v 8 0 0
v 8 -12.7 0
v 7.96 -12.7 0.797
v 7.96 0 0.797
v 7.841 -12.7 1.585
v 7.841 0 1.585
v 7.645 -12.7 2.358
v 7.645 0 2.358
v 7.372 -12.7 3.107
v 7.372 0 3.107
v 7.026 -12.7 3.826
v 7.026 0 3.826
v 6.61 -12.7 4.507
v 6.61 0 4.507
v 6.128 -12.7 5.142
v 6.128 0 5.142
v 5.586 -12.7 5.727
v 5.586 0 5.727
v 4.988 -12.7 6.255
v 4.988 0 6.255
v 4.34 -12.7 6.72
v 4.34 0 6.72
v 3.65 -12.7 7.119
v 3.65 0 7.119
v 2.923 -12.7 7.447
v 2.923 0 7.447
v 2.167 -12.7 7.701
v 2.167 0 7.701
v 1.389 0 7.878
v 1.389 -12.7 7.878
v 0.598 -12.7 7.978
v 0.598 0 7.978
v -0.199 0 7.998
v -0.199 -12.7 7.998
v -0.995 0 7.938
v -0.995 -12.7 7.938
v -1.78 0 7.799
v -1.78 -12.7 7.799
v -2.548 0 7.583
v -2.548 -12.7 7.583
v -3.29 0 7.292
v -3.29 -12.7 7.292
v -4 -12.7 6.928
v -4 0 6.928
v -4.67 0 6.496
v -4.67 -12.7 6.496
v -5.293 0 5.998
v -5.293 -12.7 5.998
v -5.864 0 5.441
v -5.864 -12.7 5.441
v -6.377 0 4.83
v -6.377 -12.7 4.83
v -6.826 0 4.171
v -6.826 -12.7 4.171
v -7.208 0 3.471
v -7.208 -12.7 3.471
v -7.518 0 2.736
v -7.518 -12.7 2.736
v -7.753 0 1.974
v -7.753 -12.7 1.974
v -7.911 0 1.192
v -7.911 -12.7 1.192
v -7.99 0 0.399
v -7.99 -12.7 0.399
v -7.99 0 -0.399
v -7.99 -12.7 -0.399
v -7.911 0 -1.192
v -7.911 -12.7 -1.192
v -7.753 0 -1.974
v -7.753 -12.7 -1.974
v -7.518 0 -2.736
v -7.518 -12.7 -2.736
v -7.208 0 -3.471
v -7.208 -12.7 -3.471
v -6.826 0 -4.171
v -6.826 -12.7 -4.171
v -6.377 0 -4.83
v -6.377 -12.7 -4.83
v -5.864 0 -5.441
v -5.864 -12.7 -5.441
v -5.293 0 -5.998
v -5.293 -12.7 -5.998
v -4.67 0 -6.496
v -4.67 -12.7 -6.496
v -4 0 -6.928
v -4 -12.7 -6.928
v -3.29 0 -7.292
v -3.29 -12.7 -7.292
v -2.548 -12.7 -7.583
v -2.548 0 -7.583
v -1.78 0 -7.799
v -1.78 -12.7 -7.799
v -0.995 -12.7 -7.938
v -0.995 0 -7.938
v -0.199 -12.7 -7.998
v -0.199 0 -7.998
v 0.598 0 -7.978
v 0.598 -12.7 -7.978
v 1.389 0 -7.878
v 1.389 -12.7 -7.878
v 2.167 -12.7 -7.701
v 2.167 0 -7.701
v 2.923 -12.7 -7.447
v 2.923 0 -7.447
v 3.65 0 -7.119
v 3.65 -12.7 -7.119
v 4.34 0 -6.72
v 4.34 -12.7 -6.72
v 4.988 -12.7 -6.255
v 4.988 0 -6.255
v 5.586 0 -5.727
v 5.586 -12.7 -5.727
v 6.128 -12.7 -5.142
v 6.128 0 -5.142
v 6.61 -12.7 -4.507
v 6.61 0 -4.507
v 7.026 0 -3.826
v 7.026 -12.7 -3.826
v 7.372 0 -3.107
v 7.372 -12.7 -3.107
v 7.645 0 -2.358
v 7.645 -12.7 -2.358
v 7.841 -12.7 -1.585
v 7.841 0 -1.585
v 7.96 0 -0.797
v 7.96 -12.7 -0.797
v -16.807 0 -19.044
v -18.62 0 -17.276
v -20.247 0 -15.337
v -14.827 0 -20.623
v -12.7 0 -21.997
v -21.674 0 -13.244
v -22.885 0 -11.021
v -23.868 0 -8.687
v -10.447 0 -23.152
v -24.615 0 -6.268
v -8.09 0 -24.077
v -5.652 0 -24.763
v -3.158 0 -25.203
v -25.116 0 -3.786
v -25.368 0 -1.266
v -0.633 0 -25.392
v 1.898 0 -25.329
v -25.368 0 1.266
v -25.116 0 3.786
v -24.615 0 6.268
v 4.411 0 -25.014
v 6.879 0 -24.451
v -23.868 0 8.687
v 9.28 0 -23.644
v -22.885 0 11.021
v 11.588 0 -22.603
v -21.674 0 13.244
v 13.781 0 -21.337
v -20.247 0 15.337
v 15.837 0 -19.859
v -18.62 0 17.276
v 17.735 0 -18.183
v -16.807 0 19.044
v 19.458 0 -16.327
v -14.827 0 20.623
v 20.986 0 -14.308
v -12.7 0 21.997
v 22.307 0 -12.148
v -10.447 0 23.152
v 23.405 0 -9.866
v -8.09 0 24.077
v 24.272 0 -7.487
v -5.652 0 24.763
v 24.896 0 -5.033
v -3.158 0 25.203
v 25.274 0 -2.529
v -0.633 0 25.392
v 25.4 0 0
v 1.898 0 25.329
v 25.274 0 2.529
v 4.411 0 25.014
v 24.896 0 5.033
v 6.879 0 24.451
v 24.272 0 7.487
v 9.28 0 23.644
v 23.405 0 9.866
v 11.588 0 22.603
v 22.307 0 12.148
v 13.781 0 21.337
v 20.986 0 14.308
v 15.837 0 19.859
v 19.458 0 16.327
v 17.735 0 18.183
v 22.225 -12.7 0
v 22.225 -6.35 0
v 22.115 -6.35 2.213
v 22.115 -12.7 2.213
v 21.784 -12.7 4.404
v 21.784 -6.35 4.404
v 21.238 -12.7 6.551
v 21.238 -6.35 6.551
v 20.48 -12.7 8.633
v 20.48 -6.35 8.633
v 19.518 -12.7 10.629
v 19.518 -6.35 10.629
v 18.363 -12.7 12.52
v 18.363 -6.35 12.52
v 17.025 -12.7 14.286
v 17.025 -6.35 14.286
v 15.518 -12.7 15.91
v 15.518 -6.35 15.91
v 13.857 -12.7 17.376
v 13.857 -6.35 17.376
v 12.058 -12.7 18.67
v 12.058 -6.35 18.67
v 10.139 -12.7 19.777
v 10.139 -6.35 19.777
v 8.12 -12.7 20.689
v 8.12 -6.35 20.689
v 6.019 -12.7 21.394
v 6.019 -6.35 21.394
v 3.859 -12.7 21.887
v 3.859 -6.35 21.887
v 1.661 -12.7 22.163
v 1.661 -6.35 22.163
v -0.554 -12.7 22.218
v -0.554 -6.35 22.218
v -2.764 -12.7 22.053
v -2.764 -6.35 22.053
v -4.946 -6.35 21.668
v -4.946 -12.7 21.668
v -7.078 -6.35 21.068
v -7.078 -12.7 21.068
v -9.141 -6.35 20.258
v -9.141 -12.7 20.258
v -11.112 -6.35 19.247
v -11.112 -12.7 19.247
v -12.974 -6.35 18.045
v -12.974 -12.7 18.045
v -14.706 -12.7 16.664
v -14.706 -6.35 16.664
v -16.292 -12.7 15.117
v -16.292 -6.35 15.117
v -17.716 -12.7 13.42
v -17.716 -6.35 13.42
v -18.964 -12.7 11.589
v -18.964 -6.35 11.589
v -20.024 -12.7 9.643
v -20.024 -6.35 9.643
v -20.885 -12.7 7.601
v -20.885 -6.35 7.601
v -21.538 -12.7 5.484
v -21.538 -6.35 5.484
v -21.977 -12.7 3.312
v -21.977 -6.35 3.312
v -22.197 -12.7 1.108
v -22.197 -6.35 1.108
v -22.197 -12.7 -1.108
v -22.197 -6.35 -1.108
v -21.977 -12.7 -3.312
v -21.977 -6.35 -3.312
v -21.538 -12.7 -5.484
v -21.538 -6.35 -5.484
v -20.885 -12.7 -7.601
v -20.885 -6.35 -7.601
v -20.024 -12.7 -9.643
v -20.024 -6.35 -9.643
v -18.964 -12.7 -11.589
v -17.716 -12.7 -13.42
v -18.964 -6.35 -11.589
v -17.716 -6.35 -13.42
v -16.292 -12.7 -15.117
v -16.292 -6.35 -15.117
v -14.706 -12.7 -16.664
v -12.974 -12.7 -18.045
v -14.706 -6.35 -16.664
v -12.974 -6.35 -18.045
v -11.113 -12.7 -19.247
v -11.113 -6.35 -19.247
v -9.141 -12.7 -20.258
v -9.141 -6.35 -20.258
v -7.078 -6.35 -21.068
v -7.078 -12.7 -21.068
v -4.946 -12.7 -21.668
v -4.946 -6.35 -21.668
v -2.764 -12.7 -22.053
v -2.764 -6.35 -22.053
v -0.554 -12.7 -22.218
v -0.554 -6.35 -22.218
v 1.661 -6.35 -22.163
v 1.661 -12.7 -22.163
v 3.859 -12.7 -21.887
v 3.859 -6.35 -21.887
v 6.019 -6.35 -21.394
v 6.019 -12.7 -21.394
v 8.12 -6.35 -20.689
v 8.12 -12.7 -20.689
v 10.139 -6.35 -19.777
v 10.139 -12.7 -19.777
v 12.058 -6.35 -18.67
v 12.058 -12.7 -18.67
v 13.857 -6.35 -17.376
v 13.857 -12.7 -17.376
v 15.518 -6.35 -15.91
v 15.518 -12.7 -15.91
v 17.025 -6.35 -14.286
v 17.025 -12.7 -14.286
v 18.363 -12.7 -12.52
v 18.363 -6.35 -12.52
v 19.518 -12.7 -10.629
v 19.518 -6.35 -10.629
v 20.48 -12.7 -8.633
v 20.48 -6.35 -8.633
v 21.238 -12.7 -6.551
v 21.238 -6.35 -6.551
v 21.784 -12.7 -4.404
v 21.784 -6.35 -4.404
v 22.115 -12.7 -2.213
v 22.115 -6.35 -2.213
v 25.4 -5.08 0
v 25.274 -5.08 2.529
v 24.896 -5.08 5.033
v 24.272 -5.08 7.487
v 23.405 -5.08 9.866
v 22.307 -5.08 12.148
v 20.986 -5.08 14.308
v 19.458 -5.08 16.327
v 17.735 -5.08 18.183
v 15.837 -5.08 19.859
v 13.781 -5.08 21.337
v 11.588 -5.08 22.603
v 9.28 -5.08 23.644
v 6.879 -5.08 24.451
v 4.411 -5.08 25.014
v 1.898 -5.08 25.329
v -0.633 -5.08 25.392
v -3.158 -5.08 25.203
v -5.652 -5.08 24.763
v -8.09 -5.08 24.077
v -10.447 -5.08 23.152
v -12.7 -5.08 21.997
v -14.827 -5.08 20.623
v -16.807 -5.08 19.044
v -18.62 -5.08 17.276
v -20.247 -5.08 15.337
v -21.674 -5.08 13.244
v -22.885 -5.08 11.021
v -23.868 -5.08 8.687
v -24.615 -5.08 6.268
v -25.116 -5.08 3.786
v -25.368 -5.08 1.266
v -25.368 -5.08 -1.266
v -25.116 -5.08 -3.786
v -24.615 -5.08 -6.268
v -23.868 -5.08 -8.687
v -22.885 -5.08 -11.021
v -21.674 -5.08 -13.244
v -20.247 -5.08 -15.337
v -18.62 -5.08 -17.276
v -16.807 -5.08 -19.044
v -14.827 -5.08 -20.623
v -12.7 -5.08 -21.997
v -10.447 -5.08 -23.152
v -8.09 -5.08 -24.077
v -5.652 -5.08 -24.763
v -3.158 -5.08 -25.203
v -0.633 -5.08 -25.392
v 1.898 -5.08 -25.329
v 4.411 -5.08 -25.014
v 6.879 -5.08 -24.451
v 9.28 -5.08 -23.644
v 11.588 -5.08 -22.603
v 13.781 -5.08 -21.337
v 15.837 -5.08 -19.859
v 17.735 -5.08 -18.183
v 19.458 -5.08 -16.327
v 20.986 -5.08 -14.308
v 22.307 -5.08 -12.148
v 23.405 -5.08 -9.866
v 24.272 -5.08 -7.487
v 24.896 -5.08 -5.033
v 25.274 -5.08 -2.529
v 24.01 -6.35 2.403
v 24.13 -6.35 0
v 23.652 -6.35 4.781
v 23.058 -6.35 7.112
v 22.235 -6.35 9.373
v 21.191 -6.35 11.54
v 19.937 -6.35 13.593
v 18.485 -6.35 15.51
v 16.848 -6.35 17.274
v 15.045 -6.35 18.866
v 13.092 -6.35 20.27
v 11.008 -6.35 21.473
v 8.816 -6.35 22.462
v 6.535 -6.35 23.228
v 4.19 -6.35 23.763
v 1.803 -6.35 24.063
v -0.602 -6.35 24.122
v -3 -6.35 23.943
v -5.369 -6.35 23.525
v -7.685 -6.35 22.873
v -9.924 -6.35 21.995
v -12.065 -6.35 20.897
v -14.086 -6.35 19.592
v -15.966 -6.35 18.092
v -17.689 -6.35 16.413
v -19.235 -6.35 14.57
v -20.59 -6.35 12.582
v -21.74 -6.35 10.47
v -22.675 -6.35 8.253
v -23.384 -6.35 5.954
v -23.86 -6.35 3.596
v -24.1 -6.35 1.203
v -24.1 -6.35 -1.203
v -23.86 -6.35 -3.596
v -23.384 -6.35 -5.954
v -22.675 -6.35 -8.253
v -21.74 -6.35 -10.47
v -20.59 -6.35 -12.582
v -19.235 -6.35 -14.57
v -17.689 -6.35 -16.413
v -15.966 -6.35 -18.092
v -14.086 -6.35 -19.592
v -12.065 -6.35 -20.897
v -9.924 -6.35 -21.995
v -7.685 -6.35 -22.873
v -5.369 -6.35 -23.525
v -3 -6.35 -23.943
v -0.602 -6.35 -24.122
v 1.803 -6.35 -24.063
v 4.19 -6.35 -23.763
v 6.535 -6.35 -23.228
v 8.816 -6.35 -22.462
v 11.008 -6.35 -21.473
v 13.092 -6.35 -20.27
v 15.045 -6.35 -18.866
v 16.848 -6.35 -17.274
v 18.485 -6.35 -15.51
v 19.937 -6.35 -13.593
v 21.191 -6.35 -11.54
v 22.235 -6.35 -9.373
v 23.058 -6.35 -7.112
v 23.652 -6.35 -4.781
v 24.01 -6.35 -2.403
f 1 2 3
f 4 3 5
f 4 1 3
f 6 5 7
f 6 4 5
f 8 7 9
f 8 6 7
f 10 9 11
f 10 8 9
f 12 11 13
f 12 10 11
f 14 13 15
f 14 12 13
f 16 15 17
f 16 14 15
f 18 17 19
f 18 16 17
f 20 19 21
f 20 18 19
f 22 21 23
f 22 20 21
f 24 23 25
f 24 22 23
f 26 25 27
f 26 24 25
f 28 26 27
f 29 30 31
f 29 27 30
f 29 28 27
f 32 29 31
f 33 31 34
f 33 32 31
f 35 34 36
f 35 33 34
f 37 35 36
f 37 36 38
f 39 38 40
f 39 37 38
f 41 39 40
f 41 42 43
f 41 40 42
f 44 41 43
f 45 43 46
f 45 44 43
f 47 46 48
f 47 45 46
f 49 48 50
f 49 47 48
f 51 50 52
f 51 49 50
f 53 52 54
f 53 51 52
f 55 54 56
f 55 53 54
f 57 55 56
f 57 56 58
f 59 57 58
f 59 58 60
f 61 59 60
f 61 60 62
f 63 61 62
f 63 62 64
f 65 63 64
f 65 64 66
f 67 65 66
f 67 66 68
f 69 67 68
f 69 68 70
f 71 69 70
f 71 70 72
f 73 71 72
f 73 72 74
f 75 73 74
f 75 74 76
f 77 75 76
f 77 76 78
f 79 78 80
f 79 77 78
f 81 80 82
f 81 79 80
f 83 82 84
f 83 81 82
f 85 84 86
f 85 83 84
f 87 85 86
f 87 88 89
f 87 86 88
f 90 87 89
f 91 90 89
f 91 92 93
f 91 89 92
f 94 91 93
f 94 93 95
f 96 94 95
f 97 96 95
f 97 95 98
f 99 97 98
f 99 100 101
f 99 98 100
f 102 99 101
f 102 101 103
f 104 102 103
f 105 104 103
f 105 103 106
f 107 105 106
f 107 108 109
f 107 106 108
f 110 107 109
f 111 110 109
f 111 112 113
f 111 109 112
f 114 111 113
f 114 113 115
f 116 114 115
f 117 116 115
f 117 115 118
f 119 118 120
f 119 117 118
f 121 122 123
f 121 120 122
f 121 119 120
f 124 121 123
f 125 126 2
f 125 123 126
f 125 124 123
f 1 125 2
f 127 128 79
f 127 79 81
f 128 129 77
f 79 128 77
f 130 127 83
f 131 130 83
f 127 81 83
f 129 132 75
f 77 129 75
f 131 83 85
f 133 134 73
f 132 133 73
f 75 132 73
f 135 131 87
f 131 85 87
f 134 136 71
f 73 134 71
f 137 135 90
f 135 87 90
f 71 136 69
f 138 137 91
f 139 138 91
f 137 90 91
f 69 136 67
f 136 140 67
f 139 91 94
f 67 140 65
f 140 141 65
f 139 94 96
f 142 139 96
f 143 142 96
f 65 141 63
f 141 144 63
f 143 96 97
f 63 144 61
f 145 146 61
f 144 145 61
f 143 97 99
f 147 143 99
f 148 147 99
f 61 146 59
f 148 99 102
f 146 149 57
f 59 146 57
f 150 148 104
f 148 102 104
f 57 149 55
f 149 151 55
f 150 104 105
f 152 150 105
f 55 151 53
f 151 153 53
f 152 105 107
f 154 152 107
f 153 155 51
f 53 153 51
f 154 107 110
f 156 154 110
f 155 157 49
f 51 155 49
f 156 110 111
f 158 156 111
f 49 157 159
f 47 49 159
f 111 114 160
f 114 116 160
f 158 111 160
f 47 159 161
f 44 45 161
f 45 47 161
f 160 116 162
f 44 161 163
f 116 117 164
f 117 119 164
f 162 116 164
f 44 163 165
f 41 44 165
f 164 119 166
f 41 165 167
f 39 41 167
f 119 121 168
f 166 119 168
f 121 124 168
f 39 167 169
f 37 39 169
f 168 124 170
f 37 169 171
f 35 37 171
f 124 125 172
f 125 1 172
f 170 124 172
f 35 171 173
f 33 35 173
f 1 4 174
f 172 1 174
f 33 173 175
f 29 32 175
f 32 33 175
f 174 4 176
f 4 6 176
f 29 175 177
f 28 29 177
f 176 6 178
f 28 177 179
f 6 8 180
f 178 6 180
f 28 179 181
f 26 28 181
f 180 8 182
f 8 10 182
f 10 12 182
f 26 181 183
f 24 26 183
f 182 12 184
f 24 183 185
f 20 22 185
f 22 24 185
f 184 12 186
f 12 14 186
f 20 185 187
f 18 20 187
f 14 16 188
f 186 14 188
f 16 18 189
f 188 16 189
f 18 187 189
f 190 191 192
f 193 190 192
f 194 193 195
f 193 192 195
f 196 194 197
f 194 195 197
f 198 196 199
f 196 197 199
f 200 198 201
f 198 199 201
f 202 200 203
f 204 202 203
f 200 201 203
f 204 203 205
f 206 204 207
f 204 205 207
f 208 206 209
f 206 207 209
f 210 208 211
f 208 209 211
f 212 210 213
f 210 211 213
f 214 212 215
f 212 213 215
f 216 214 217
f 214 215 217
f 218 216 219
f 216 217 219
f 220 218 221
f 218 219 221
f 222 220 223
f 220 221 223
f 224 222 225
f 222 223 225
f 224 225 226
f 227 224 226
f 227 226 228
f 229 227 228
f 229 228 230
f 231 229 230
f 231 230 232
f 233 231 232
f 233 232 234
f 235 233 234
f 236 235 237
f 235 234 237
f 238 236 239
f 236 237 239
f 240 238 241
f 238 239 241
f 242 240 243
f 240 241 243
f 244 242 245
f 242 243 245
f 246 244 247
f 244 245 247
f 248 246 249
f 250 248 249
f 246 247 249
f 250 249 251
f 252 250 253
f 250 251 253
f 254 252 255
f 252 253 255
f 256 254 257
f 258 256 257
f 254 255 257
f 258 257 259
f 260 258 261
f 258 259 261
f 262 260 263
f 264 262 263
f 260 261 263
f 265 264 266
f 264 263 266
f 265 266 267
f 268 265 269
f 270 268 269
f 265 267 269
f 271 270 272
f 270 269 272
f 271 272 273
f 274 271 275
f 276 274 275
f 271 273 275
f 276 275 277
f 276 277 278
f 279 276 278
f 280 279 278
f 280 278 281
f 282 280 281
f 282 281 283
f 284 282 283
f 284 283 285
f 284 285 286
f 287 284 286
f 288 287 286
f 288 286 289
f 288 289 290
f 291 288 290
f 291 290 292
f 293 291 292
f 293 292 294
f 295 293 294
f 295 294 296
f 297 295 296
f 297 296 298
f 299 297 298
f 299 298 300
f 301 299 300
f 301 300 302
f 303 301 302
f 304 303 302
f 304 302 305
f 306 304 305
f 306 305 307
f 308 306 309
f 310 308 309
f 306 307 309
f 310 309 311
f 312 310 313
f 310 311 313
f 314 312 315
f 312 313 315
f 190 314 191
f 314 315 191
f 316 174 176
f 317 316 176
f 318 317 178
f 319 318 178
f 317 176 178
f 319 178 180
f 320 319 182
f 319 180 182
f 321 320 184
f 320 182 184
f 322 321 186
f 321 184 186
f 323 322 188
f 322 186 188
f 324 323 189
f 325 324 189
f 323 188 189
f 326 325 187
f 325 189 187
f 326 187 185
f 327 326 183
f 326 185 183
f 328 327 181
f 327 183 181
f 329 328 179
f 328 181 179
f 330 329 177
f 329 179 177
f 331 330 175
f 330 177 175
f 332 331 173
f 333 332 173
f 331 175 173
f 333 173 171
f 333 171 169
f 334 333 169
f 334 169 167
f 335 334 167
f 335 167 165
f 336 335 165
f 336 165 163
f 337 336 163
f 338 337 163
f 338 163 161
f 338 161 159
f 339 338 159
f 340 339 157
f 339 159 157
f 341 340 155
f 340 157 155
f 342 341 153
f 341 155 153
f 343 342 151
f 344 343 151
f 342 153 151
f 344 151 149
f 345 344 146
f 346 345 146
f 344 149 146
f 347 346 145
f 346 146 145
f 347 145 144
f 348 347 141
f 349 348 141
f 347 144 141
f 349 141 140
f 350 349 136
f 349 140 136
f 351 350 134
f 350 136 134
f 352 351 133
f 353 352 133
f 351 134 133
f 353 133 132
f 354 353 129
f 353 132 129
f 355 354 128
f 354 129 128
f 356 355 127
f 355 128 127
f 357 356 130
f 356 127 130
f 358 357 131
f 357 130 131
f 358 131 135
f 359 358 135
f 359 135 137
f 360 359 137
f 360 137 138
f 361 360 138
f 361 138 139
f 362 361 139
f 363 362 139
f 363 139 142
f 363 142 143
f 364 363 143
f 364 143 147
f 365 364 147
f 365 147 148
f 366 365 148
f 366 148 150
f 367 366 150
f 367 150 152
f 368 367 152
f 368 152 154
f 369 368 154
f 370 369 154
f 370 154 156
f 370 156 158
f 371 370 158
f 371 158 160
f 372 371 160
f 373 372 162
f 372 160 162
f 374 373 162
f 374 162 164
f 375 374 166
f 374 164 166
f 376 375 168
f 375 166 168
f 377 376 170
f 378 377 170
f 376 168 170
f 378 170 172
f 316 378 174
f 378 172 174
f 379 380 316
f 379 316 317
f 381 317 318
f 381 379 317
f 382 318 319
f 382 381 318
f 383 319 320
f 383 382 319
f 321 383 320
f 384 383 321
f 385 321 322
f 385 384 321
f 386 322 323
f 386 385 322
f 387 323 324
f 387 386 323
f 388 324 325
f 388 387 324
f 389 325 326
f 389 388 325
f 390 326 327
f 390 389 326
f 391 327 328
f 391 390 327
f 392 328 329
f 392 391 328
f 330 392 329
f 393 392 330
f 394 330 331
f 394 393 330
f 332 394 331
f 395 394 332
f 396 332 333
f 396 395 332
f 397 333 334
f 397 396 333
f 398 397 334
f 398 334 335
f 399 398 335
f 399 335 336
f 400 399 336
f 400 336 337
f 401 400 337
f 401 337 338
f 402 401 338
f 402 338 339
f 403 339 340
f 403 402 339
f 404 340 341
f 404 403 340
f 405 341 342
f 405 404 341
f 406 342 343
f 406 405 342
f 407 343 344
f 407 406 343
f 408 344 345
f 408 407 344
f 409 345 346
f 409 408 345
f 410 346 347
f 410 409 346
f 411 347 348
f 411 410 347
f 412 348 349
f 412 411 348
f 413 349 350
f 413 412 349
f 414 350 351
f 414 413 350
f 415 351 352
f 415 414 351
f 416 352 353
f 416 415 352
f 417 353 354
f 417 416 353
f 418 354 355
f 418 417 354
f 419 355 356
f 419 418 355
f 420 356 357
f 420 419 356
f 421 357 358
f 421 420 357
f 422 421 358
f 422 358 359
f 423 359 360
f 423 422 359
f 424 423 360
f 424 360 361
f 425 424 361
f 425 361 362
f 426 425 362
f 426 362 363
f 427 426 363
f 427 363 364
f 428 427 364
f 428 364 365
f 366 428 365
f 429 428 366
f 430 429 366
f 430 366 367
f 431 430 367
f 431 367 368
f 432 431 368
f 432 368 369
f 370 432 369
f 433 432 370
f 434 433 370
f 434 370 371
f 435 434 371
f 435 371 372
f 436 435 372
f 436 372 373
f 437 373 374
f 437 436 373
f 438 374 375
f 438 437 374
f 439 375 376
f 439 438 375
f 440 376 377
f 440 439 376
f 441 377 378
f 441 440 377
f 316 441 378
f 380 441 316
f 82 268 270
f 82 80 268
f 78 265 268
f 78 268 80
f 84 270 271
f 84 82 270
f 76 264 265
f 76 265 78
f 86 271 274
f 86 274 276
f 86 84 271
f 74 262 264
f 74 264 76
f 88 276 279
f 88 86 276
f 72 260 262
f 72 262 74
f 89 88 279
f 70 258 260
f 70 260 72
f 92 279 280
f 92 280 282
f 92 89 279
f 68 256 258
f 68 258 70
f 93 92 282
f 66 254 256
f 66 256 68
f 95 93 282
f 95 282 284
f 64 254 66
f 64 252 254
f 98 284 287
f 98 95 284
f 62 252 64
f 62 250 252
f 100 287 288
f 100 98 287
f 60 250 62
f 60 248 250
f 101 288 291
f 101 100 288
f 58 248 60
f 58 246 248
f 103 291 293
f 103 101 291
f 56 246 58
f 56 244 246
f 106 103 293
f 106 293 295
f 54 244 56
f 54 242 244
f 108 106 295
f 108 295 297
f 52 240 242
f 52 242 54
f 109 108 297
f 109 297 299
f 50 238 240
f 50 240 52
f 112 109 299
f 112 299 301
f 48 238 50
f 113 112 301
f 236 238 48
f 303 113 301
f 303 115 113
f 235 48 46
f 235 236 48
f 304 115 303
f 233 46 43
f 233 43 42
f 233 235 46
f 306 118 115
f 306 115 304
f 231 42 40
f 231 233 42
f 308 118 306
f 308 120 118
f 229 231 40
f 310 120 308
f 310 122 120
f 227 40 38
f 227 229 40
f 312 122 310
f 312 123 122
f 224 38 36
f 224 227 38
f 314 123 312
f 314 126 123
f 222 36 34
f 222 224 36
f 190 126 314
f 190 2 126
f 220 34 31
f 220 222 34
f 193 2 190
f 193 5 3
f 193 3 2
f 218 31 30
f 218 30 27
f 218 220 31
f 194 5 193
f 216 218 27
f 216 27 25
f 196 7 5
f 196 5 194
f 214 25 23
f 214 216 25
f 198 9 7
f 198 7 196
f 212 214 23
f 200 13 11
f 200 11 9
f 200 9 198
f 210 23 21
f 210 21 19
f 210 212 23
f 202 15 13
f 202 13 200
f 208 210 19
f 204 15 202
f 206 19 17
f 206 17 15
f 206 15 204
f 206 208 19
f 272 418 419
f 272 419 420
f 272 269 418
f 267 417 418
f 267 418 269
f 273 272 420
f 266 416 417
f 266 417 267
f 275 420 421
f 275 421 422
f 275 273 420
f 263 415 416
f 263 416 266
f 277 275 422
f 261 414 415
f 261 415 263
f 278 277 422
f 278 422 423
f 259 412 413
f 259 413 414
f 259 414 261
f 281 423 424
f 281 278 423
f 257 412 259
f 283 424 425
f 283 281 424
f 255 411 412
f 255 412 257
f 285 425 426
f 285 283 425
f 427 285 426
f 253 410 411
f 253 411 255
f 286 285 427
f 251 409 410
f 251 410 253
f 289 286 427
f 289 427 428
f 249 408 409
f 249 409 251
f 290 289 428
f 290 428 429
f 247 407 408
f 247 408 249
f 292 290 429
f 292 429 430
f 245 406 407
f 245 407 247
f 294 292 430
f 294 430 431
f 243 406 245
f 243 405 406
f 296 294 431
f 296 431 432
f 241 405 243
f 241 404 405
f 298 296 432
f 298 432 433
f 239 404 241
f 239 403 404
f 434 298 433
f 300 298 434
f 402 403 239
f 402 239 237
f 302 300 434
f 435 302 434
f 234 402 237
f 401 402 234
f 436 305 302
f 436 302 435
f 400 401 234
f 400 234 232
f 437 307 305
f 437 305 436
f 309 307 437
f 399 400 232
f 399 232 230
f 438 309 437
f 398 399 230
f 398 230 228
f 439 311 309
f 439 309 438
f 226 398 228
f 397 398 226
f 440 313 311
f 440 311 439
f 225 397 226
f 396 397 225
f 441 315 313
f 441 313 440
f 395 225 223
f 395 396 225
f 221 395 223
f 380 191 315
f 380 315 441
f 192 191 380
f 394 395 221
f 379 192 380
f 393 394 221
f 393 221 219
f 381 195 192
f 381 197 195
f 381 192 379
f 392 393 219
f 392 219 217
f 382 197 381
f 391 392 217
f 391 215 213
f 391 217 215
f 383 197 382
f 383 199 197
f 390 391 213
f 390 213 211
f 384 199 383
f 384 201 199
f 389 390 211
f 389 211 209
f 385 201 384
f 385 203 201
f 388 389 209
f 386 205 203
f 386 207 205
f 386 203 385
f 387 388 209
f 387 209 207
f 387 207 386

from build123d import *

# Parameters (mm, degrees)
F0_R     = 25.4
F1_DEPTH = 6.35
F2_R     = 22.225
F3_DEPTH = 6.35
F4_R     = 8
F5_DEPTH = 12.701
F6_SIZE  = 1.27


with BuildPart() as f1:
    # F0 (on Front) → F1 (new body)
    with BuildSketch(Plane.XZ):
        Circle(F0_R)
    extrude(amount=F1_DEPTH)

    # F2 (on face) → F3 (join)
    with BuildSketch(Plane.XZ.offset(6.35)):
        Circle(F2_R)
    extrude(amount=F3_DEPTH)

    # F4 (on Front) → F5 (cut, through all)
    with BuildSketch(Plane.XZ):
        Circle(F4_R)
    extrude(amount=F5_DEPTH, mode=Mode.SUBTRACT)

    # F6
    f6_edges = [f1.edges().sort_by_distance(p)[0] for p in [
        (-25.4, -6.35, 0),
    ]]
    chamfer(f6_edges, length=F6_SIZE)


solid = f1.part
